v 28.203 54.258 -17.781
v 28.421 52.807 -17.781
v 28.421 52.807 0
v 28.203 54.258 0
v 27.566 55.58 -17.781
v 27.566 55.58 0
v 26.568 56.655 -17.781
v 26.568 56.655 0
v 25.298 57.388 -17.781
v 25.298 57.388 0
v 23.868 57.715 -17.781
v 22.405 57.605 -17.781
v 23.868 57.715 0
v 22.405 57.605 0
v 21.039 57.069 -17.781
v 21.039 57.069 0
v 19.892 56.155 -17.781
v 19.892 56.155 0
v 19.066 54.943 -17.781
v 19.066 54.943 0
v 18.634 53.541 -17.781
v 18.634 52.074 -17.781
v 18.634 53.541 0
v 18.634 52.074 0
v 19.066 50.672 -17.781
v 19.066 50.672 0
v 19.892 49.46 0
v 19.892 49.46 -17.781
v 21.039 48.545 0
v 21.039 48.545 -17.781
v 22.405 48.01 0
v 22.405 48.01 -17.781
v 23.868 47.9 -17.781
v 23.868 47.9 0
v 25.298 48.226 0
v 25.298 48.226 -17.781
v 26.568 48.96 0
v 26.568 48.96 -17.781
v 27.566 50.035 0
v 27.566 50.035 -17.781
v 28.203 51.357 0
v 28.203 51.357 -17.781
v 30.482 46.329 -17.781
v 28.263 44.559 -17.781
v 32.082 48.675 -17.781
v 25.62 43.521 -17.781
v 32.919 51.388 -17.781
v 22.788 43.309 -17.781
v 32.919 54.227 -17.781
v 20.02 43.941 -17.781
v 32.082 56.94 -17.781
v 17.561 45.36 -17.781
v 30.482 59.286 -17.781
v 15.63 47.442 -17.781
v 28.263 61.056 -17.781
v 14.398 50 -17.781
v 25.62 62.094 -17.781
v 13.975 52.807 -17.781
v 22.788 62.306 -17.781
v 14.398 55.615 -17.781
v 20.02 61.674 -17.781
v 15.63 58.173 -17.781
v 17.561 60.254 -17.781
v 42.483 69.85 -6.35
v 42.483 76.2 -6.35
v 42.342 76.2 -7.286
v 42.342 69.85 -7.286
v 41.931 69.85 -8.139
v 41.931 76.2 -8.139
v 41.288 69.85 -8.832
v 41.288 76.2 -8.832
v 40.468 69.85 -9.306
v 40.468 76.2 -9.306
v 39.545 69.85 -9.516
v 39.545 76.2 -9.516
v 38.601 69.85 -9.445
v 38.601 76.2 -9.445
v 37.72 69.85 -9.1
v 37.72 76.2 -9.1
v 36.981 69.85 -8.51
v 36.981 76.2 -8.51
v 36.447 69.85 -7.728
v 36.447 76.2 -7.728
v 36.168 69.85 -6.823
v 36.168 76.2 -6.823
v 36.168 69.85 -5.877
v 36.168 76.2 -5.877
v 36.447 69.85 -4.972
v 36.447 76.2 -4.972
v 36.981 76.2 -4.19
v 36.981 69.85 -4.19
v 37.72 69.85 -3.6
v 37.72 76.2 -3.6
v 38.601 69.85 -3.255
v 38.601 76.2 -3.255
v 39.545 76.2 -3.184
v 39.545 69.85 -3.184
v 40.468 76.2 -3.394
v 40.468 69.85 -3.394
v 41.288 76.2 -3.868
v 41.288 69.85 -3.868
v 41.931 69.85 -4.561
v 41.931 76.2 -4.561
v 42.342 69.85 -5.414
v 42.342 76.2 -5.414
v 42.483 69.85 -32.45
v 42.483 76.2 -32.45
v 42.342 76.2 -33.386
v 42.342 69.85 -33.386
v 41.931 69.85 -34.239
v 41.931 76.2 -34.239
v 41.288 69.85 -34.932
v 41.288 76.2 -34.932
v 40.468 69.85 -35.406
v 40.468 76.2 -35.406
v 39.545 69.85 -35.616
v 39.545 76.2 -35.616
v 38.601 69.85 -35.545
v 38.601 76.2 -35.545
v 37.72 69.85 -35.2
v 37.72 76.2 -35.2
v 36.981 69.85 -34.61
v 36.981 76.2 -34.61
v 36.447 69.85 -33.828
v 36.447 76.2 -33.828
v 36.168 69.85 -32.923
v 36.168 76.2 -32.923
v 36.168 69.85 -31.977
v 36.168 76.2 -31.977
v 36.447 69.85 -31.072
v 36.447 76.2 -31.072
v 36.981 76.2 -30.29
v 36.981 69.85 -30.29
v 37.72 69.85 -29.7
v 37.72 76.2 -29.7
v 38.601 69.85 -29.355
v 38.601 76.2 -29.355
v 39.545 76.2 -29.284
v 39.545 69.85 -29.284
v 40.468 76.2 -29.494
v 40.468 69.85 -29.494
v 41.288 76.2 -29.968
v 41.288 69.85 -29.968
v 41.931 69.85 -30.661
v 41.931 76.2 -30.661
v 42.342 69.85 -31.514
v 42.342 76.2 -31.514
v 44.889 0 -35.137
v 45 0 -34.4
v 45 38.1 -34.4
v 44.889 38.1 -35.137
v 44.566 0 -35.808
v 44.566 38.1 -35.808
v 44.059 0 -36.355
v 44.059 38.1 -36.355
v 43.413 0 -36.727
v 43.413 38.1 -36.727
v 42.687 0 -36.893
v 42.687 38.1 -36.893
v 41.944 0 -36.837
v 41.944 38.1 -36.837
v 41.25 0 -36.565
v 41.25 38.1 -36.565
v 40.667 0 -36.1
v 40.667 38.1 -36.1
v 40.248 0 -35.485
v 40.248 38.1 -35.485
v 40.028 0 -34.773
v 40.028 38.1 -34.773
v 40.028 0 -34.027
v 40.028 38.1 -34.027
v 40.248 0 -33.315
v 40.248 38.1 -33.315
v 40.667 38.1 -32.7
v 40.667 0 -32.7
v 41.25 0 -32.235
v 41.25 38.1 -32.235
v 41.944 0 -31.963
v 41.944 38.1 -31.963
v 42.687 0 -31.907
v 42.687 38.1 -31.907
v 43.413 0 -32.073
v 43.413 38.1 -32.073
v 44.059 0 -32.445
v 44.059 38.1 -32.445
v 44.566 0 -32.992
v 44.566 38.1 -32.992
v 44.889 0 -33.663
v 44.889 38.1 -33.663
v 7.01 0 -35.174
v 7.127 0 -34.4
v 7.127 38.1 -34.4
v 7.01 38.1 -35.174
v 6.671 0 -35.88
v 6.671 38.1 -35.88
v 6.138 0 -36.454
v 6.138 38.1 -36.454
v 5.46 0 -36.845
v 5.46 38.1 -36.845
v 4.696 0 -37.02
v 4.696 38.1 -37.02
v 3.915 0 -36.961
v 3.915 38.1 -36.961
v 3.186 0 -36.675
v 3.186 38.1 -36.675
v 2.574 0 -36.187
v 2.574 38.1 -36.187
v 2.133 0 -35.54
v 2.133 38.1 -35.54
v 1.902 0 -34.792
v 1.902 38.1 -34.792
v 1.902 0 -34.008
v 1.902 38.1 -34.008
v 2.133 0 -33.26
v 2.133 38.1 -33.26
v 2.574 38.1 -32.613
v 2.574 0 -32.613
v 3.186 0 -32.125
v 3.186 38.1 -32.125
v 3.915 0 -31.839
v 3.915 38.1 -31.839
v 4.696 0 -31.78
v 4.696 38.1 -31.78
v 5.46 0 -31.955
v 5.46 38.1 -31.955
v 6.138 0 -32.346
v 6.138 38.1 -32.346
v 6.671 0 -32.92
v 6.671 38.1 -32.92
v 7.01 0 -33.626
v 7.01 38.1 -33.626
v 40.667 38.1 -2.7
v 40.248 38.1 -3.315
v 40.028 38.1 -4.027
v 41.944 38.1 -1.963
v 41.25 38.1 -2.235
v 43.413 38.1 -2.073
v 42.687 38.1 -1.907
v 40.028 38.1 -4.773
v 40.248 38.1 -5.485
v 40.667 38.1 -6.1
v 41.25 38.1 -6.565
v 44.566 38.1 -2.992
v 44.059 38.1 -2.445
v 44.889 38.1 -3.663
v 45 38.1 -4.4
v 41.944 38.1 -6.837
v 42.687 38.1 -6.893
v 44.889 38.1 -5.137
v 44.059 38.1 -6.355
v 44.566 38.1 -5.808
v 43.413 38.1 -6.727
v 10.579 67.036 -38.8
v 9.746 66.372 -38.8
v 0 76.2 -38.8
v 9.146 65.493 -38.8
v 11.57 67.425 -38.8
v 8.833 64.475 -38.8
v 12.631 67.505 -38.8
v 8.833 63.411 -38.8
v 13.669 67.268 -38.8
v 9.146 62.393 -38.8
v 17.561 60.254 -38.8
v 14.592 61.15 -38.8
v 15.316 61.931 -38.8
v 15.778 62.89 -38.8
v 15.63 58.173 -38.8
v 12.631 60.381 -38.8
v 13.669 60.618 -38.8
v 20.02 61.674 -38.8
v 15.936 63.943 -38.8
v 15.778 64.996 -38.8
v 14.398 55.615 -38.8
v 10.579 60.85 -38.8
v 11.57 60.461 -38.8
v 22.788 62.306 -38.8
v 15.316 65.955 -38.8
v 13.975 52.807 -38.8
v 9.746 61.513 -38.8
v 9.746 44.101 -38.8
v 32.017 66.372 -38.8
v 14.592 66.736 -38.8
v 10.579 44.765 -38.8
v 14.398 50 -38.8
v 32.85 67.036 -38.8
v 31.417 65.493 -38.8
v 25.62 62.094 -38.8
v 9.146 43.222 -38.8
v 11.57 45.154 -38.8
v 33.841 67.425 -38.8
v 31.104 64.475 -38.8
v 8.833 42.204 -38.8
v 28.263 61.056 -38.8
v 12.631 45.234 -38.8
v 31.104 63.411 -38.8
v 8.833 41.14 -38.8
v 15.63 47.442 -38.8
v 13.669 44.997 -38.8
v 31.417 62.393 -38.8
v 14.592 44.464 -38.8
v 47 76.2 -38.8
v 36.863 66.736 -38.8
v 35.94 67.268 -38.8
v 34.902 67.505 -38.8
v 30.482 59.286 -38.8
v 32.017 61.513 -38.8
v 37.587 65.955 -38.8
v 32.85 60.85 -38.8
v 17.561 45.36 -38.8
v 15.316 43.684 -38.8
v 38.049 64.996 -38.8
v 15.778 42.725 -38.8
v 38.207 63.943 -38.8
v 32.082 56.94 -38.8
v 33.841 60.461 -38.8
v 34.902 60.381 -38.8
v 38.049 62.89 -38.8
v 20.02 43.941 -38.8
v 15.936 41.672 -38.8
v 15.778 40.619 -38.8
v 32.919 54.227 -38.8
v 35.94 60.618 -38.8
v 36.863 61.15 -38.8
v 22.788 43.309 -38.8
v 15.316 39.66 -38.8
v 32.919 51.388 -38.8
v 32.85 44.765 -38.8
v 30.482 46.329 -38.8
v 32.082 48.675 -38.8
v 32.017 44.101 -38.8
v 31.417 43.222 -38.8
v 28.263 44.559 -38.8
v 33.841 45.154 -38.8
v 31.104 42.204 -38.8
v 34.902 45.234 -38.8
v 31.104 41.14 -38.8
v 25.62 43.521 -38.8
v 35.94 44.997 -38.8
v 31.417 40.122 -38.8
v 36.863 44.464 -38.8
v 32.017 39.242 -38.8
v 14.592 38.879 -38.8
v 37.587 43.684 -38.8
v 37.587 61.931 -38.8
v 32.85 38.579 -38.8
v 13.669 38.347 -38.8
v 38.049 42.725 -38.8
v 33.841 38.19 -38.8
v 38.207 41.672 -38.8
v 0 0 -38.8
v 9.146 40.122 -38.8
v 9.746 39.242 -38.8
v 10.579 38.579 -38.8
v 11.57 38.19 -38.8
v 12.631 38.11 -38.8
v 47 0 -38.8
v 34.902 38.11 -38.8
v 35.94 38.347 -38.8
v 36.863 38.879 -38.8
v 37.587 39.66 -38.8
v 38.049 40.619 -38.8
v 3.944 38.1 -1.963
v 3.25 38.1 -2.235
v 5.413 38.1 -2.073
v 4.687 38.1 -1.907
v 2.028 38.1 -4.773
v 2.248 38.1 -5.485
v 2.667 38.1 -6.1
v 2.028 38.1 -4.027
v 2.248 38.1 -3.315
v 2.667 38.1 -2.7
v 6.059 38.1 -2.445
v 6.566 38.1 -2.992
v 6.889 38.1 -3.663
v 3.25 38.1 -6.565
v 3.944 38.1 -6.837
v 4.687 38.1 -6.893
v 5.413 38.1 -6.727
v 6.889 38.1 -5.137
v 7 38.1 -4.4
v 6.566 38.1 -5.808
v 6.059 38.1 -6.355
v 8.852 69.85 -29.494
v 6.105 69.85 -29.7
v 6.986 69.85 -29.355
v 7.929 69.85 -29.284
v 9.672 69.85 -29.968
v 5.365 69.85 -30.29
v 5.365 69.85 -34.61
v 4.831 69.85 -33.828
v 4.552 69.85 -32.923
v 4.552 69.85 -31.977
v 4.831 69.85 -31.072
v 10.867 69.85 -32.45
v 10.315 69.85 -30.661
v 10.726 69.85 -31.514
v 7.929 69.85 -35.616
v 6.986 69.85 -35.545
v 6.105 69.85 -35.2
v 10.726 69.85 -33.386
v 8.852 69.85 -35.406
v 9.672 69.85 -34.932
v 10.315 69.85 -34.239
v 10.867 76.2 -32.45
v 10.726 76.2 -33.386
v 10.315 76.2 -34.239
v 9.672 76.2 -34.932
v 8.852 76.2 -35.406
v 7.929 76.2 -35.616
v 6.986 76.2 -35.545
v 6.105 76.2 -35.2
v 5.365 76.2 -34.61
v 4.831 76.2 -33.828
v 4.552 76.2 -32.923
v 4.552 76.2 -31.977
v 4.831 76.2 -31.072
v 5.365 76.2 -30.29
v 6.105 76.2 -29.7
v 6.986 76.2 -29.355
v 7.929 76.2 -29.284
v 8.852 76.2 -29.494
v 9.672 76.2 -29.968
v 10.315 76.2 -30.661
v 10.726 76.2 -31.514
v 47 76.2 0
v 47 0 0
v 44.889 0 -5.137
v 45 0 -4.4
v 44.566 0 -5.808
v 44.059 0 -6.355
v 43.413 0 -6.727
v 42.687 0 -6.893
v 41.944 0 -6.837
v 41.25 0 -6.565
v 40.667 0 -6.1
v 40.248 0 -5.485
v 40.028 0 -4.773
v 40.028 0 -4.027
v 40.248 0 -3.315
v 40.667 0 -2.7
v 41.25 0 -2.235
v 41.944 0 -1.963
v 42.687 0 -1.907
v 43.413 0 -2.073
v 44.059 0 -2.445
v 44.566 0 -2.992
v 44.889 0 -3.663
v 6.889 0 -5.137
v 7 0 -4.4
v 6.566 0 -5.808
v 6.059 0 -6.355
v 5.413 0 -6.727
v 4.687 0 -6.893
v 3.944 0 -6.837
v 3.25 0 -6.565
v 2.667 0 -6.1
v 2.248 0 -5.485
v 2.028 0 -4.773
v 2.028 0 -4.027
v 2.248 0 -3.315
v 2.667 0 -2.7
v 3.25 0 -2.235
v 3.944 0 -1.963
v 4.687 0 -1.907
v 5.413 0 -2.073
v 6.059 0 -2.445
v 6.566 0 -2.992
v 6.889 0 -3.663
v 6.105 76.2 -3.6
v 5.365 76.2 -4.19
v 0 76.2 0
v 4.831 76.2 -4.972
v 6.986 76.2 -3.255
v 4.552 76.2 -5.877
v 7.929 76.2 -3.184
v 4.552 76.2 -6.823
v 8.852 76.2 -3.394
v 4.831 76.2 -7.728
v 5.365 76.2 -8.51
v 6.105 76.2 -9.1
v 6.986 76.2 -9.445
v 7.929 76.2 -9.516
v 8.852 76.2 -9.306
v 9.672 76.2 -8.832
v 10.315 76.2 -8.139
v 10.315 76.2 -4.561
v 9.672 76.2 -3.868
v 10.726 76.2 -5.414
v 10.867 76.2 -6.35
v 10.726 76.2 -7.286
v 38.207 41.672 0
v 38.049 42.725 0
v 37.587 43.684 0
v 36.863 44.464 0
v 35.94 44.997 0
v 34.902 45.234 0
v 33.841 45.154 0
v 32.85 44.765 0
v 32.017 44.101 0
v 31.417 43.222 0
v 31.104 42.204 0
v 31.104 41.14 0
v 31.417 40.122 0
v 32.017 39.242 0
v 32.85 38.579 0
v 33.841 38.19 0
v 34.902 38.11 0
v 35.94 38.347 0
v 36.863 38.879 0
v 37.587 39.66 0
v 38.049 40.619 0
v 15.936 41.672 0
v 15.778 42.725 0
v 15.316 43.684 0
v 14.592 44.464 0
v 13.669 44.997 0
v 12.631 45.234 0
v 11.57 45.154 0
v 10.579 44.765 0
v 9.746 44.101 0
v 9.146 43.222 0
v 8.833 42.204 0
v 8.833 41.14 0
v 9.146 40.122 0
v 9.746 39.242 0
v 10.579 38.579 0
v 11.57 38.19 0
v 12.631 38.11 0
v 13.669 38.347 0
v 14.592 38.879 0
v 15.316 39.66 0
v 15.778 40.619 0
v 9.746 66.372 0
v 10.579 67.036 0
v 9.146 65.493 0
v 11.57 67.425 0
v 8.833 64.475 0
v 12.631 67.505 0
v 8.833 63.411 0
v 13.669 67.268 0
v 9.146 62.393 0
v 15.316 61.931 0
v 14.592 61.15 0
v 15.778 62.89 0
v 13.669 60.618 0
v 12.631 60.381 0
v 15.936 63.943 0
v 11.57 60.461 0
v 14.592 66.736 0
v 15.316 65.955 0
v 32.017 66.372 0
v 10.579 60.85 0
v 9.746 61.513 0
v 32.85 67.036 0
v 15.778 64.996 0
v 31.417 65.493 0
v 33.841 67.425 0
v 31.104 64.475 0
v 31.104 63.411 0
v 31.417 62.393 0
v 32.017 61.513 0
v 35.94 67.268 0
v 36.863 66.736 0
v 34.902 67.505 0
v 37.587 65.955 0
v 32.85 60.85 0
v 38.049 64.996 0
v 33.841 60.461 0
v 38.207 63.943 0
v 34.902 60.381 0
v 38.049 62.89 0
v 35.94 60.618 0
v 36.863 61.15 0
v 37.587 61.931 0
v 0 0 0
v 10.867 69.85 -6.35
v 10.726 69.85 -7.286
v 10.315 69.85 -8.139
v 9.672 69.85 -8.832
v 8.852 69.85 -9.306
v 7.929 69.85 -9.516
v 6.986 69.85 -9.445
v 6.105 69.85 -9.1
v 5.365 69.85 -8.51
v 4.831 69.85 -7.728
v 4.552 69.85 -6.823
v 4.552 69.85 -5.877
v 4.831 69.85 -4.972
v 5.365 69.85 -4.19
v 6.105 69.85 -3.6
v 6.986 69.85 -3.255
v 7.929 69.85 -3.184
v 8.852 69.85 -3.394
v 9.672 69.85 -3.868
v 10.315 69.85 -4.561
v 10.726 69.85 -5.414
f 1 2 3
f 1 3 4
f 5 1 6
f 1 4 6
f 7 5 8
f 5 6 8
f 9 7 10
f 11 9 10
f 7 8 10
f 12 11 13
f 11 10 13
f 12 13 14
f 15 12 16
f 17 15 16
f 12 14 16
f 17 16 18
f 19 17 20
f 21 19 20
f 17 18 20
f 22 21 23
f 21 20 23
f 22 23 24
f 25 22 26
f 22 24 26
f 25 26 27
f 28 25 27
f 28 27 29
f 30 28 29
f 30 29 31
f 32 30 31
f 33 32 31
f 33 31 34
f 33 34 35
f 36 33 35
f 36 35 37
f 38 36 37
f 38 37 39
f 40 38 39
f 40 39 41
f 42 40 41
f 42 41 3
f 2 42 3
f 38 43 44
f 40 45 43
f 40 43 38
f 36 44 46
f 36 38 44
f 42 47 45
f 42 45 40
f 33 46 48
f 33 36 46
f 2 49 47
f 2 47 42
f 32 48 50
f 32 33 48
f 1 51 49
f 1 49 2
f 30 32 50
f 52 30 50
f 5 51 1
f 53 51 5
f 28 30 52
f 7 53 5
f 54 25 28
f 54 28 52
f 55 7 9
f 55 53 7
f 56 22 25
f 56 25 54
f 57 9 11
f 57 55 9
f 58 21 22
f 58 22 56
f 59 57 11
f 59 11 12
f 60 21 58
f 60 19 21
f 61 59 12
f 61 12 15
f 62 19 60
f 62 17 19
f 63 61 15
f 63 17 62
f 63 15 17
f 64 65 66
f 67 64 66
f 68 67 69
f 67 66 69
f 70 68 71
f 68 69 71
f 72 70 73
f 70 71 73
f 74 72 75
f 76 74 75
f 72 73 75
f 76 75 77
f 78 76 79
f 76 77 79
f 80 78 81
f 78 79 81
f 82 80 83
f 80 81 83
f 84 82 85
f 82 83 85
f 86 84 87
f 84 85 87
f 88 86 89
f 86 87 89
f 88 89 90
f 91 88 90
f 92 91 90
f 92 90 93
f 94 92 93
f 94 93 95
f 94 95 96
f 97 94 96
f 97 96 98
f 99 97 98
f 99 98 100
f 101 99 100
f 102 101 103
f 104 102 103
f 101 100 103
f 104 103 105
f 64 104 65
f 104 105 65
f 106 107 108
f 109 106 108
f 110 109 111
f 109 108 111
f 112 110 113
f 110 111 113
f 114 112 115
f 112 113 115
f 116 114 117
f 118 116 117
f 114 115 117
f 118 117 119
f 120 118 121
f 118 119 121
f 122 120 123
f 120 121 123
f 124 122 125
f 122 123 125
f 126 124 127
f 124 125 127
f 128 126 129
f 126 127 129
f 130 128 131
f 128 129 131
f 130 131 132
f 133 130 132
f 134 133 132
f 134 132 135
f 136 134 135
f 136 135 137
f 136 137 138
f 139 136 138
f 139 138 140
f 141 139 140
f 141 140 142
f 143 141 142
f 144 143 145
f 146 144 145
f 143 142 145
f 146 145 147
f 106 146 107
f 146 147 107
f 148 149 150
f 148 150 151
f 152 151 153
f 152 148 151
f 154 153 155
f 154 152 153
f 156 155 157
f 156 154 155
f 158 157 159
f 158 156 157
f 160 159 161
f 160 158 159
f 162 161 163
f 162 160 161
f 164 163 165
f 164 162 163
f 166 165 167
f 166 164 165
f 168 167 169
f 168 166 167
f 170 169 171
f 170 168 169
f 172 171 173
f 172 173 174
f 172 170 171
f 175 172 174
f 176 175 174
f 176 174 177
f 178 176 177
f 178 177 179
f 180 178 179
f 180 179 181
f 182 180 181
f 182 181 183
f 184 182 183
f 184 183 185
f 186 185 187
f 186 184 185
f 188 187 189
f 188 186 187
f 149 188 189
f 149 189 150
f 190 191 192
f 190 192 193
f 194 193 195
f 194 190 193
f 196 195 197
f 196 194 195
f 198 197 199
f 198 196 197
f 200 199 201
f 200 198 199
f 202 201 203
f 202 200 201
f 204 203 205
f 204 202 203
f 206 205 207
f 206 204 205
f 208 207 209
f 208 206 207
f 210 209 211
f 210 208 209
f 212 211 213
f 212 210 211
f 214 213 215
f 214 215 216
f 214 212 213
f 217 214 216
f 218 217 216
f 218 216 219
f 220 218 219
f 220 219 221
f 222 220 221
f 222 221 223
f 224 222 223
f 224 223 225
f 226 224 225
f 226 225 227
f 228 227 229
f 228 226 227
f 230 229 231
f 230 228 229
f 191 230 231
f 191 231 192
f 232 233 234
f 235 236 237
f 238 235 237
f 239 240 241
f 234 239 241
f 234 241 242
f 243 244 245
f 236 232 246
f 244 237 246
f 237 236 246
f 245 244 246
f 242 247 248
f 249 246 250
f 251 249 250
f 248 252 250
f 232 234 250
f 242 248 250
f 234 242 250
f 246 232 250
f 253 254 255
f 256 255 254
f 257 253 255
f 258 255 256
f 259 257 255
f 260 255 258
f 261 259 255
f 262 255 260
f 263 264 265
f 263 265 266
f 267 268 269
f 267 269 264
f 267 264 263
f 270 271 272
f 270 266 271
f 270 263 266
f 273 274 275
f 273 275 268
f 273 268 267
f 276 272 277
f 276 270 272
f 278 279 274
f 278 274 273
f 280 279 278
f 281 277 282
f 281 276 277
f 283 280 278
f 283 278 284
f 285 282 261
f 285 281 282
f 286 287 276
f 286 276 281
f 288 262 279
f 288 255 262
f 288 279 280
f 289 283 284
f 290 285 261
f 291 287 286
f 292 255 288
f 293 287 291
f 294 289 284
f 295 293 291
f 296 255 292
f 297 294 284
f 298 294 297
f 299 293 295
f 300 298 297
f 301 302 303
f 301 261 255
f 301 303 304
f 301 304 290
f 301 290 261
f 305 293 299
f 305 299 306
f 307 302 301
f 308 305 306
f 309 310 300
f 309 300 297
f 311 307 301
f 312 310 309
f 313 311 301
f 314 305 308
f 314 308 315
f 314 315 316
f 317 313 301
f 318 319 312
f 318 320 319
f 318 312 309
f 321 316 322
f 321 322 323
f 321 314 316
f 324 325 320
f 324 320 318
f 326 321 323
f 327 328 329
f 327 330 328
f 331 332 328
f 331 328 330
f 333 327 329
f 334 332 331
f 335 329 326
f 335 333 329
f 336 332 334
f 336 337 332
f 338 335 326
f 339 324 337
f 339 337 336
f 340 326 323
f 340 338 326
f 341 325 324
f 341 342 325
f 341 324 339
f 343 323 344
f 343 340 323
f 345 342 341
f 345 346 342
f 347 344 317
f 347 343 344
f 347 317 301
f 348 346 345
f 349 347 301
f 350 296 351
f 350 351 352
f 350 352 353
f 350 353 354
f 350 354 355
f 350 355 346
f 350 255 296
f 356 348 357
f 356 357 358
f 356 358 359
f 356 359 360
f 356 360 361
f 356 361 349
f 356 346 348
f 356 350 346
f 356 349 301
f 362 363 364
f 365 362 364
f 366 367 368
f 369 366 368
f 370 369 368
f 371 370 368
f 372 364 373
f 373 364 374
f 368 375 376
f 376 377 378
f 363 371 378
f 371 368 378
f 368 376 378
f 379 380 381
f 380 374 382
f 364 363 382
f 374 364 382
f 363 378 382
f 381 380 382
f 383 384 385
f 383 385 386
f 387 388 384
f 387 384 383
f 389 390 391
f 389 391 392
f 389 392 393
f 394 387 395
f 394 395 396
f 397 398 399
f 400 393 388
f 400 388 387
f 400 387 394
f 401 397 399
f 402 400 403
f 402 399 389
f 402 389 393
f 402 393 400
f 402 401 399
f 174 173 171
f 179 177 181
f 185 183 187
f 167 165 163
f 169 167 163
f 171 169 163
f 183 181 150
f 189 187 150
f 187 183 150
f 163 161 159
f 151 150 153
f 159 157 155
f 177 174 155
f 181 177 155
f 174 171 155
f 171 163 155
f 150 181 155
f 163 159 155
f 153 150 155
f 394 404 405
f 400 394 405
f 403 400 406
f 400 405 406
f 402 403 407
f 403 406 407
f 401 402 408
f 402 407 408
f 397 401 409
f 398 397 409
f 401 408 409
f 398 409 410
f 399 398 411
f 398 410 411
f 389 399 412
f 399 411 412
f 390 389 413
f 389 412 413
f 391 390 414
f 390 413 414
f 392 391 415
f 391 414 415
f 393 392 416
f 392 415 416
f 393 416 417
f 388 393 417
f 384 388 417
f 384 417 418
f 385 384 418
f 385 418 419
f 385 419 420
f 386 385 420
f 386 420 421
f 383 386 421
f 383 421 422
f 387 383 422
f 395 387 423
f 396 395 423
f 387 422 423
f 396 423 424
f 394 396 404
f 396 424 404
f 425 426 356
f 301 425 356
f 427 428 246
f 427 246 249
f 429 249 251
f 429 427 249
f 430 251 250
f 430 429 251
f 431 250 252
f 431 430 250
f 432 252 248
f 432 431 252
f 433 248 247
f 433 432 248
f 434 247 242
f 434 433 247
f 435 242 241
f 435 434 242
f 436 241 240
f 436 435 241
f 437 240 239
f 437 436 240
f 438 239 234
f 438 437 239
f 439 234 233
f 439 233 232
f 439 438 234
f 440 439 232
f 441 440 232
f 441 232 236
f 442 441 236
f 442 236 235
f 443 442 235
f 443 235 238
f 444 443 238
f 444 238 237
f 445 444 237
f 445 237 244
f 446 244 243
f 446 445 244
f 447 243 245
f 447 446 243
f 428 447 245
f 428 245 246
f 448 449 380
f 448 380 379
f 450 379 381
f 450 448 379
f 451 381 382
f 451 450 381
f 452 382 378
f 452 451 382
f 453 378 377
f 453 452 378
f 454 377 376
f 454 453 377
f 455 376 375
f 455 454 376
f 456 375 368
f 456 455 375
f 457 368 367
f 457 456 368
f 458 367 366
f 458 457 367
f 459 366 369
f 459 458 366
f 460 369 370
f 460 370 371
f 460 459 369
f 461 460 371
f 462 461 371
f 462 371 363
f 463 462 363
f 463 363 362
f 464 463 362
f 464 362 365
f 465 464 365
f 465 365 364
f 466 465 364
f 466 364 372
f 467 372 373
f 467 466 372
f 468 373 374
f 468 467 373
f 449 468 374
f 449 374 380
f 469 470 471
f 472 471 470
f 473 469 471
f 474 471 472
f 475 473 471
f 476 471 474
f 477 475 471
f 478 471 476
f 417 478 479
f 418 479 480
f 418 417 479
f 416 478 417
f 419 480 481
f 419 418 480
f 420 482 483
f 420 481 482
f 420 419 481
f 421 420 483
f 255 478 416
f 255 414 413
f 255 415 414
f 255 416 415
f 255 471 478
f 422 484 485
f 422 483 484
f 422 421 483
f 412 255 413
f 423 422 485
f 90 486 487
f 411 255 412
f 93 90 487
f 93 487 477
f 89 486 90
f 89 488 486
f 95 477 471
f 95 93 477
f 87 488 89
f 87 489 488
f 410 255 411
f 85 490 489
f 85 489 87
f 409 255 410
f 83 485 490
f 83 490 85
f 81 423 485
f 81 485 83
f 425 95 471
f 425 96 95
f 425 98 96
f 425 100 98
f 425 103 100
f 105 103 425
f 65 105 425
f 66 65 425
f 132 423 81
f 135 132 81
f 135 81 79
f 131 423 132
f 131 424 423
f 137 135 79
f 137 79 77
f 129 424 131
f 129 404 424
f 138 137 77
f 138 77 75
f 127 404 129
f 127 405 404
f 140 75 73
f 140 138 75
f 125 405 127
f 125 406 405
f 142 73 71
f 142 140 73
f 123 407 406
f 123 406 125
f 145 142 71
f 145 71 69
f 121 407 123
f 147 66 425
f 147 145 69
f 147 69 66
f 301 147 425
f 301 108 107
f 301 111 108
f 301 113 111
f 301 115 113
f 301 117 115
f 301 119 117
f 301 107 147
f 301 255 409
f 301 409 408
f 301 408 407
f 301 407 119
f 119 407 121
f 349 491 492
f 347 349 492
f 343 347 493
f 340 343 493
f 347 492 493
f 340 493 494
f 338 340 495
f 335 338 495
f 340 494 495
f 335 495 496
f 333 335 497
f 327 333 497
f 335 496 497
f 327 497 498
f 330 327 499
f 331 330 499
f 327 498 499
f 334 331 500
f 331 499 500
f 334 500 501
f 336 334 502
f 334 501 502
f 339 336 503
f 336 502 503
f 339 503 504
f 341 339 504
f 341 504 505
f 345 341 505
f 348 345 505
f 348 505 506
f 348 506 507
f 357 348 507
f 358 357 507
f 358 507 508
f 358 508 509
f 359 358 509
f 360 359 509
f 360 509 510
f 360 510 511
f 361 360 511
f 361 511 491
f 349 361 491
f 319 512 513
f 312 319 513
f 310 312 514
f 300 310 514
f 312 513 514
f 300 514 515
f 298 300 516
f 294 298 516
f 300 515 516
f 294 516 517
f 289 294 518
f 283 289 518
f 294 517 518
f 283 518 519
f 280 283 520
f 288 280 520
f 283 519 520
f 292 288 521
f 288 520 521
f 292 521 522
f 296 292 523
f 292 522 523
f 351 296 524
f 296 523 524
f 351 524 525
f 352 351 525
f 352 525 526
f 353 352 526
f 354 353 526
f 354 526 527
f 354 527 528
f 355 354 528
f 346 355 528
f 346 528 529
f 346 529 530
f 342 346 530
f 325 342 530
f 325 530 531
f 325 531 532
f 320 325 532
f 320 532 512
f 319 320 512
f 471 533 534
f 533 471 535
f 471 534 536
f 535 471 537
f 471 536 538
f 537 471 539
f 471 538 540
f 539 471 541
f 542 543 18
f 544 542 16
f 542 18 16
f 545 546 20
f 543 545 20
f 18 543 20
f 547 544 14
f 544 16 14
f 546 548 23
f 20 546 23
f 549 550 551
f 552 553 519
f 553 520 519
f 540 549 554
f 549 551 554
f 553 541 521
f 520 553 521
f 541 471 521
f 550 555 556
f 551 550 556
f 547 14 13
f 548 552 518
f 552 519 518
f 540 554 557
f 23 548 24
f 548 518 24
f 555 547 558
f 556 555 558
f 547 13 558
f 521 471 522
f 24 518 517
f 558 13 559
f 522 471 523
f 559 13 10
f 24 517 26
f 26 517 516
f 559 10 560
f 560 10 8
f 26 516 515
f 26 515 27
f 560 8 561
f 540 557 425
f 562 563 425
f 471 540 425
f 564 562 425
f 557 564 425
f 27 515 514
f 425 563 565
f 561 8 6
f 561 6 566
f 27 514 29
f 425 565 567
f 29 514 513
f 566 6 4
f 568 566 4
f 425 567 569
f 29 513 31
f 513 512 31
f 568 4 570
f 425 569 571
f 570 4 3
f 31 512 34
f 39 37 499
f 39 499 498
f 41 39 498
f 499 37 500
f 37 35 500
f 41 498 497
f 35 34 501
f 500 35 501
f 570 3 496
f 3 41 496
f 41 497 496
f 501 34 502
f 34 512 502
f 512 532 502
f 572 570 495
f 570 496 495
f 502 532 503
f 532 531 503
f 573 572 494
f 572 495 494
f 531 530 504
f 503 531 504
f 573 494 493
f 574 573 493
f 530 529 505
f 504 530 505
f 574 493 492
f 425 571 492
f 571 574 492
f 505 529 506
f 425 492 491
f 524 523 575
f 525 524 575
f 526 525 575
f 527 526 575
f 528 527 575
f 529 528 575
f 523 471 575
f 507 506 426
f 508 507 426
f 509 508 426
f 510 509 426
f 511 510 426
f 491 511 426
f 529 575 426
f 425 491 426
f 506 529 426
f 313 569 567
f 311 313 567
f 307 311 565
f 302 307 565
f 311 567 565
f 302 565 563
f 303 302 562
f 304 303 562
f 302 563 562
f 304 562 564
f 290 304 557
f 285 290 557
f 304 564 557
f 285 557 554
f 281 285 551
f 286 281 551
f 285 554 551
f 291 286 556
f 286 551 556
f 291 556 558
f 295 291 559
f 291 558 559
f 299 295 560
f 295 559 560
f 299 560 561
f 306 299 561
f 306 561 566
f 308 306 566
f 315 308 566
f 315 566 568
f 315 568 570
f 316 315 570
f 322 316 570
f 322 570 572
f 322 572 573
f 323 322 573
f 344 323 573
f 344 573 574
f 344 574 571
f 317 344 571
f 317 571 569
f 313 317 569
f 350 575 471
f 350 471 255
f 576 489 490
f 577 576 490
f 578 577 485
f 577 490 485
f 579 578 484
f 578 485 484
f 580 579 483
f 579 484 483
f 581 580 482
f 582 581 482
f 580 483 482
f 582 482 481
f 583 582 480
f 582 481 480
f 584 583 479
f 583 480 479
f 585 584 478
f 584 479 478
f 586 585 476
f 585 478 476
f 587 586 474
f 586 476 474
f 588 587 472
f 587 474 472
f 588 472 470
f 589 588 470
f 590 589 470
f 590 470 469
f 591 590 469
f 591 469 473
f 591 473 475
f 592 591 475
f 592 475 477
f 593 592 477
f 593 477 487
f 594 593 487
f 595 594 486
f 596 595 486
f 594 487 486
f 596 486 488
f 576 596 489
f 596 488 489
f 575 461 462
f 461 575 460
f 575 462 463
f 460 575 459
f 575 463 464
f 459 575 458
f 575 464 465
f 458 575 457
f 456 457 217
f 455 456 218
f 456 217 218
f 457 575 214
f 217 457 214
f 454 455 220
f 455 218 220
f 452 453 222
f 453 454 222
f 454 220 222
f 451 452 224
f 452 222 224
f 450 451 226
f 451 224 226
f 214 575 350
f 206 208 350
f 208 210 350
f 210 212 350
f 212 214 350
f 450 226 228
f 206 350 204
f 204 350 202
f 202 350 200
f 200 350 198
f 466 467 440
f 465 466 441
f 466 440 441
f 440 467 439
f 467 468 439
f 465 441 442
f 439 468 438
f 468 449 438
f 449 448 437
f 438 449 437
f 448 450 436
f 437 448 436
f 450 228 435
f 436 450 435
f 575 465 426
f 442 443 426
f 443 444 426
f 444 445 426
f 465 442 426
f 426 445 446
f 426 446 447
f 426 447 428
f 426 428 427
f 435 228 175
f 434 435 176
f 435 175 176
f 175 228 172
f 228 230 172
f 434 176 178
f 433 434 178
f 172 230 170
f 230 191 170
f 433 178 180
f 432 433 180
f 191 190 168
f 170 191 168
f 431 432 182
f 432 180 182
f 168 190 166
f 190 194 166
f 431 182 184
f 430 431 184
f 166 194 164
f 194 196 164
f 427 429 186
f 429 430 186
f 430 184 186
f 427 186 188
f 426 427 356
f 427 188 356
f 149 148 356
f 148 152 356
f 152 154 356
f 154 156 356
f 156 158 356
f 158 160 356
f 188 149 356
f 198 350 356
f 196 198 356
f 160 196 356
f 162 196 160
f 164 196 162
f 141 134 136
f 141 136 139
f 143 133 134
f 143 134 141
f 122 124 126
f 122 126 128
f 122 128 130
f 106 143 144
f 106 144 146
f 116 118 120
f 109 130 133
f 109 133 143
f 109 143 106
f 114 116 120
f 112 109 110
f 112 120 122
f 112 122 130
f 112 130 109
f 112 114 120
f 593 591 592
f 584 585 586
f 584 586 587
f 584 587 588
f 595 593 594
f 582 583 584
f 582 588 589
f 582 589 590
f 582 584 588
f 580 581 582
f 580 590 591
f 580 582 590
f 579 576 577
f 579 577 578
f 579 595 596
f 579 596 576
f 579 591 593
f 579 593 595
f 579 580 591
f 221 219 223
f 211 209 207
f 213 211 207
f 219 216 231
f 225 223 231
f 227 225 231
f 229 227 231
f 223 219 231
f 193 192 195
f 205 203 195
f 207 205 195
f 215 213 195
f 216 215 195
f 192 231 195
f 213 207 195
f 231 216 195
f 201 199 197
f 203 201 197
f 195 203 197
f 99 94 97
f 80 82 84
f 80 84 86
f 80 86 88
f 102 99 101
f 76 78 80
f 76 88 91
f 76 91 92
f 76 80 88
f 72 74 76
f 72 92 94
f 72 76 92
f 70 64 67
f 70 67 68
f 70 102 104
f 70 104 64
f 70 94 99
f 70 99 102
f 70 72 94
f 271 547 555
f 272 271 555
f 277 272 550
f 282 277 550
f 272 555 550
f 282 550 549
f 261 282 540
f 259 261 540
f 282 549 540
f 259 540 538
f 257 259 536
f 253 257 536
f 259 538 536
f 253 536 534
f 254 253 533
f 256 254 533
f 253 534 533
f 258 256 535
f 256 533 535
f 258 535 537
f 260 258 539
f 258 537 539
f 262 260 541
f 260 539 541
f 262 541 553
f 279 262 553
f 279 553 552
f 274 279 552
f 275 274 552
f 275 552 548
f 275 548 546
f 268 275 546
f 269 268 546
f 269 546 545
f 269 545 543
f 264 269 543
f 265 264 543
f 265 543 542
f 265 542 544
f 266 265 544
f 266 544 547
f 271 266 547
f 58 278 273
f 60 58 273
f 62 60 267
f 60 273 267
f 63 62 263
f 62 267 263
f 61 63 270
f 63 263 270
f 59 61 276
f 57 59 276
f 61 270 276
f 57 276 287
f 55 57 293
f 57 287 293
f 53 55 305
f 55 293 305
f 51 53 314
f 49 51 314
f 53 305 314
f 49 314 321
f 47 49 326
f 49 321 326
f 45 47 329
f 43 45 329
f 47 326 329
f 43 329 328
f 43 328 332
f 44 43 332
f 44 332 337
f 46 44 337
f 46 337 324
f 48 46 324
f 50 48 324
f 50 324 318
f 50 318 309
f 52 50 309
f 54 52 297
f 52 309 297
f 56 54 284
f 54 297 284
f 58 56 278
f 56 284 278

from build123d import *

# Parameters (mm, degrees)
SKETCH1_W           = 47
SKETCH1_H           = 38.8
BOSS_EXTRUDE1_DEPTH = 76.2
SKETCH2_R           = 3.571875
SKETCH2_R_2         = 4.92125
CUT_EXTRUDE1_DEPTH  = 98.574996797
SKETCH1_8_R         = 2.5
SKETCH1_8_R_2       = 2.627
CUT_EXTRUDE2_DEPTH  = 38.1
SKETCH4_R           = 9.525
CUT_EXTRUDE4_DEPTH  = 21.0185
SKETCH5_R           = 3.175
CUT_EXTRUDE5_DEPTH  = 6.35


with BuildPart() as part:
    # Sketch1 → Boss-Extrude1 (new body)
    with BuildSketch(Plane(origin=(0, 0, 0), x_dir=(1, 0, 0), z_dir=(0, 1, 0))):
        with Locations((23.5, 19.4)):
            Rectangle(SKETCH1_W, SKETCH1_H)
    extrude(amount=BOSS_EXTRUDE1_DEPTH)

    # Sketch2 → Cut-Extrude1 (cut, through all)
    with BuildSketch(Plane.XY):
        with Locations((34.63551759, 63.94291018)):
            Circle(SKETCH2_R)
        with Locations((34.63551759, 41.671875)):
            Circle(SKETCH2_R)
        with Locations((12.36448241, 41.671875)):
            Circle(SKETCH2_R)
        with Locations((12.36448241, 63.94291018)):
            Circle(SKETCH2_R)
        with Locations((23.5, 52.80739259)):
            Circle(SKETCH2_R_2)
    extrude(amount=-CUT_EXTRUDE1_DEPTH, mode=Mode.SUBTRACT)

    # Sketch1<8> → Cut-Extrude2 (cut)
    with BuildSketch(Plane(origin=(0, 0, 0), x_dir=(1, 0, 0), z_dir=(0, 1, 0))):
        with Locations((42.5, 34.4)):
            Circle(SKETCH1_8_R)
        with Locations((42.5, 4.4)):
            Circle(SKETCH1_8_R)
        with Locations((4.5, 4.4)):
            Circle(SKETCH1_8_R)
        with Locations((4.5, 34.4)):
            Circle(SKETCH1_8_R_2)
    extrude(amount=CUT_EXTRUDE2_DEPTH, mode=Mode.SUBTRACT)

    # Sketch4 → Cut-Extrude4 (cut)
    with BuildSketch(Plane(origin=(0, 0, -38.8), x_dir=(-1, 0, 0), z_dir=(0, 0, -1))):
        with Locations((-23.5, 52.80739259)):
            Circle(SKETCH4_R)
    extrude(amount=-CUT_EXTRUDE4_DEPTH, mode=Mode.SUBTRACT)

    # Sketch5 → Cut-Extrude5 (cut)
    with BuildSketch(Plane(origin=(0, 76.2, 0), x_dir=(1, 0, 0), z_dir=(0, 1, 0))):
        with Locations((7.692010309, 32.45)):
            Circle(SKETCH5_R)
        with Locations((39.307989691, 32.45)):
            Circle(SKETCH5_R)
        with Locations((39.307989691, 6.35)):
            Circle(SKETCH5_R)
        with Locations((7.692010309, 6.35)):
            Circle(SKETCH5_R)
    extrude(amount=-CUT_EXTRUDE5_DEPTH, mode=Mode.SUBTRACT)


solid = part.part
